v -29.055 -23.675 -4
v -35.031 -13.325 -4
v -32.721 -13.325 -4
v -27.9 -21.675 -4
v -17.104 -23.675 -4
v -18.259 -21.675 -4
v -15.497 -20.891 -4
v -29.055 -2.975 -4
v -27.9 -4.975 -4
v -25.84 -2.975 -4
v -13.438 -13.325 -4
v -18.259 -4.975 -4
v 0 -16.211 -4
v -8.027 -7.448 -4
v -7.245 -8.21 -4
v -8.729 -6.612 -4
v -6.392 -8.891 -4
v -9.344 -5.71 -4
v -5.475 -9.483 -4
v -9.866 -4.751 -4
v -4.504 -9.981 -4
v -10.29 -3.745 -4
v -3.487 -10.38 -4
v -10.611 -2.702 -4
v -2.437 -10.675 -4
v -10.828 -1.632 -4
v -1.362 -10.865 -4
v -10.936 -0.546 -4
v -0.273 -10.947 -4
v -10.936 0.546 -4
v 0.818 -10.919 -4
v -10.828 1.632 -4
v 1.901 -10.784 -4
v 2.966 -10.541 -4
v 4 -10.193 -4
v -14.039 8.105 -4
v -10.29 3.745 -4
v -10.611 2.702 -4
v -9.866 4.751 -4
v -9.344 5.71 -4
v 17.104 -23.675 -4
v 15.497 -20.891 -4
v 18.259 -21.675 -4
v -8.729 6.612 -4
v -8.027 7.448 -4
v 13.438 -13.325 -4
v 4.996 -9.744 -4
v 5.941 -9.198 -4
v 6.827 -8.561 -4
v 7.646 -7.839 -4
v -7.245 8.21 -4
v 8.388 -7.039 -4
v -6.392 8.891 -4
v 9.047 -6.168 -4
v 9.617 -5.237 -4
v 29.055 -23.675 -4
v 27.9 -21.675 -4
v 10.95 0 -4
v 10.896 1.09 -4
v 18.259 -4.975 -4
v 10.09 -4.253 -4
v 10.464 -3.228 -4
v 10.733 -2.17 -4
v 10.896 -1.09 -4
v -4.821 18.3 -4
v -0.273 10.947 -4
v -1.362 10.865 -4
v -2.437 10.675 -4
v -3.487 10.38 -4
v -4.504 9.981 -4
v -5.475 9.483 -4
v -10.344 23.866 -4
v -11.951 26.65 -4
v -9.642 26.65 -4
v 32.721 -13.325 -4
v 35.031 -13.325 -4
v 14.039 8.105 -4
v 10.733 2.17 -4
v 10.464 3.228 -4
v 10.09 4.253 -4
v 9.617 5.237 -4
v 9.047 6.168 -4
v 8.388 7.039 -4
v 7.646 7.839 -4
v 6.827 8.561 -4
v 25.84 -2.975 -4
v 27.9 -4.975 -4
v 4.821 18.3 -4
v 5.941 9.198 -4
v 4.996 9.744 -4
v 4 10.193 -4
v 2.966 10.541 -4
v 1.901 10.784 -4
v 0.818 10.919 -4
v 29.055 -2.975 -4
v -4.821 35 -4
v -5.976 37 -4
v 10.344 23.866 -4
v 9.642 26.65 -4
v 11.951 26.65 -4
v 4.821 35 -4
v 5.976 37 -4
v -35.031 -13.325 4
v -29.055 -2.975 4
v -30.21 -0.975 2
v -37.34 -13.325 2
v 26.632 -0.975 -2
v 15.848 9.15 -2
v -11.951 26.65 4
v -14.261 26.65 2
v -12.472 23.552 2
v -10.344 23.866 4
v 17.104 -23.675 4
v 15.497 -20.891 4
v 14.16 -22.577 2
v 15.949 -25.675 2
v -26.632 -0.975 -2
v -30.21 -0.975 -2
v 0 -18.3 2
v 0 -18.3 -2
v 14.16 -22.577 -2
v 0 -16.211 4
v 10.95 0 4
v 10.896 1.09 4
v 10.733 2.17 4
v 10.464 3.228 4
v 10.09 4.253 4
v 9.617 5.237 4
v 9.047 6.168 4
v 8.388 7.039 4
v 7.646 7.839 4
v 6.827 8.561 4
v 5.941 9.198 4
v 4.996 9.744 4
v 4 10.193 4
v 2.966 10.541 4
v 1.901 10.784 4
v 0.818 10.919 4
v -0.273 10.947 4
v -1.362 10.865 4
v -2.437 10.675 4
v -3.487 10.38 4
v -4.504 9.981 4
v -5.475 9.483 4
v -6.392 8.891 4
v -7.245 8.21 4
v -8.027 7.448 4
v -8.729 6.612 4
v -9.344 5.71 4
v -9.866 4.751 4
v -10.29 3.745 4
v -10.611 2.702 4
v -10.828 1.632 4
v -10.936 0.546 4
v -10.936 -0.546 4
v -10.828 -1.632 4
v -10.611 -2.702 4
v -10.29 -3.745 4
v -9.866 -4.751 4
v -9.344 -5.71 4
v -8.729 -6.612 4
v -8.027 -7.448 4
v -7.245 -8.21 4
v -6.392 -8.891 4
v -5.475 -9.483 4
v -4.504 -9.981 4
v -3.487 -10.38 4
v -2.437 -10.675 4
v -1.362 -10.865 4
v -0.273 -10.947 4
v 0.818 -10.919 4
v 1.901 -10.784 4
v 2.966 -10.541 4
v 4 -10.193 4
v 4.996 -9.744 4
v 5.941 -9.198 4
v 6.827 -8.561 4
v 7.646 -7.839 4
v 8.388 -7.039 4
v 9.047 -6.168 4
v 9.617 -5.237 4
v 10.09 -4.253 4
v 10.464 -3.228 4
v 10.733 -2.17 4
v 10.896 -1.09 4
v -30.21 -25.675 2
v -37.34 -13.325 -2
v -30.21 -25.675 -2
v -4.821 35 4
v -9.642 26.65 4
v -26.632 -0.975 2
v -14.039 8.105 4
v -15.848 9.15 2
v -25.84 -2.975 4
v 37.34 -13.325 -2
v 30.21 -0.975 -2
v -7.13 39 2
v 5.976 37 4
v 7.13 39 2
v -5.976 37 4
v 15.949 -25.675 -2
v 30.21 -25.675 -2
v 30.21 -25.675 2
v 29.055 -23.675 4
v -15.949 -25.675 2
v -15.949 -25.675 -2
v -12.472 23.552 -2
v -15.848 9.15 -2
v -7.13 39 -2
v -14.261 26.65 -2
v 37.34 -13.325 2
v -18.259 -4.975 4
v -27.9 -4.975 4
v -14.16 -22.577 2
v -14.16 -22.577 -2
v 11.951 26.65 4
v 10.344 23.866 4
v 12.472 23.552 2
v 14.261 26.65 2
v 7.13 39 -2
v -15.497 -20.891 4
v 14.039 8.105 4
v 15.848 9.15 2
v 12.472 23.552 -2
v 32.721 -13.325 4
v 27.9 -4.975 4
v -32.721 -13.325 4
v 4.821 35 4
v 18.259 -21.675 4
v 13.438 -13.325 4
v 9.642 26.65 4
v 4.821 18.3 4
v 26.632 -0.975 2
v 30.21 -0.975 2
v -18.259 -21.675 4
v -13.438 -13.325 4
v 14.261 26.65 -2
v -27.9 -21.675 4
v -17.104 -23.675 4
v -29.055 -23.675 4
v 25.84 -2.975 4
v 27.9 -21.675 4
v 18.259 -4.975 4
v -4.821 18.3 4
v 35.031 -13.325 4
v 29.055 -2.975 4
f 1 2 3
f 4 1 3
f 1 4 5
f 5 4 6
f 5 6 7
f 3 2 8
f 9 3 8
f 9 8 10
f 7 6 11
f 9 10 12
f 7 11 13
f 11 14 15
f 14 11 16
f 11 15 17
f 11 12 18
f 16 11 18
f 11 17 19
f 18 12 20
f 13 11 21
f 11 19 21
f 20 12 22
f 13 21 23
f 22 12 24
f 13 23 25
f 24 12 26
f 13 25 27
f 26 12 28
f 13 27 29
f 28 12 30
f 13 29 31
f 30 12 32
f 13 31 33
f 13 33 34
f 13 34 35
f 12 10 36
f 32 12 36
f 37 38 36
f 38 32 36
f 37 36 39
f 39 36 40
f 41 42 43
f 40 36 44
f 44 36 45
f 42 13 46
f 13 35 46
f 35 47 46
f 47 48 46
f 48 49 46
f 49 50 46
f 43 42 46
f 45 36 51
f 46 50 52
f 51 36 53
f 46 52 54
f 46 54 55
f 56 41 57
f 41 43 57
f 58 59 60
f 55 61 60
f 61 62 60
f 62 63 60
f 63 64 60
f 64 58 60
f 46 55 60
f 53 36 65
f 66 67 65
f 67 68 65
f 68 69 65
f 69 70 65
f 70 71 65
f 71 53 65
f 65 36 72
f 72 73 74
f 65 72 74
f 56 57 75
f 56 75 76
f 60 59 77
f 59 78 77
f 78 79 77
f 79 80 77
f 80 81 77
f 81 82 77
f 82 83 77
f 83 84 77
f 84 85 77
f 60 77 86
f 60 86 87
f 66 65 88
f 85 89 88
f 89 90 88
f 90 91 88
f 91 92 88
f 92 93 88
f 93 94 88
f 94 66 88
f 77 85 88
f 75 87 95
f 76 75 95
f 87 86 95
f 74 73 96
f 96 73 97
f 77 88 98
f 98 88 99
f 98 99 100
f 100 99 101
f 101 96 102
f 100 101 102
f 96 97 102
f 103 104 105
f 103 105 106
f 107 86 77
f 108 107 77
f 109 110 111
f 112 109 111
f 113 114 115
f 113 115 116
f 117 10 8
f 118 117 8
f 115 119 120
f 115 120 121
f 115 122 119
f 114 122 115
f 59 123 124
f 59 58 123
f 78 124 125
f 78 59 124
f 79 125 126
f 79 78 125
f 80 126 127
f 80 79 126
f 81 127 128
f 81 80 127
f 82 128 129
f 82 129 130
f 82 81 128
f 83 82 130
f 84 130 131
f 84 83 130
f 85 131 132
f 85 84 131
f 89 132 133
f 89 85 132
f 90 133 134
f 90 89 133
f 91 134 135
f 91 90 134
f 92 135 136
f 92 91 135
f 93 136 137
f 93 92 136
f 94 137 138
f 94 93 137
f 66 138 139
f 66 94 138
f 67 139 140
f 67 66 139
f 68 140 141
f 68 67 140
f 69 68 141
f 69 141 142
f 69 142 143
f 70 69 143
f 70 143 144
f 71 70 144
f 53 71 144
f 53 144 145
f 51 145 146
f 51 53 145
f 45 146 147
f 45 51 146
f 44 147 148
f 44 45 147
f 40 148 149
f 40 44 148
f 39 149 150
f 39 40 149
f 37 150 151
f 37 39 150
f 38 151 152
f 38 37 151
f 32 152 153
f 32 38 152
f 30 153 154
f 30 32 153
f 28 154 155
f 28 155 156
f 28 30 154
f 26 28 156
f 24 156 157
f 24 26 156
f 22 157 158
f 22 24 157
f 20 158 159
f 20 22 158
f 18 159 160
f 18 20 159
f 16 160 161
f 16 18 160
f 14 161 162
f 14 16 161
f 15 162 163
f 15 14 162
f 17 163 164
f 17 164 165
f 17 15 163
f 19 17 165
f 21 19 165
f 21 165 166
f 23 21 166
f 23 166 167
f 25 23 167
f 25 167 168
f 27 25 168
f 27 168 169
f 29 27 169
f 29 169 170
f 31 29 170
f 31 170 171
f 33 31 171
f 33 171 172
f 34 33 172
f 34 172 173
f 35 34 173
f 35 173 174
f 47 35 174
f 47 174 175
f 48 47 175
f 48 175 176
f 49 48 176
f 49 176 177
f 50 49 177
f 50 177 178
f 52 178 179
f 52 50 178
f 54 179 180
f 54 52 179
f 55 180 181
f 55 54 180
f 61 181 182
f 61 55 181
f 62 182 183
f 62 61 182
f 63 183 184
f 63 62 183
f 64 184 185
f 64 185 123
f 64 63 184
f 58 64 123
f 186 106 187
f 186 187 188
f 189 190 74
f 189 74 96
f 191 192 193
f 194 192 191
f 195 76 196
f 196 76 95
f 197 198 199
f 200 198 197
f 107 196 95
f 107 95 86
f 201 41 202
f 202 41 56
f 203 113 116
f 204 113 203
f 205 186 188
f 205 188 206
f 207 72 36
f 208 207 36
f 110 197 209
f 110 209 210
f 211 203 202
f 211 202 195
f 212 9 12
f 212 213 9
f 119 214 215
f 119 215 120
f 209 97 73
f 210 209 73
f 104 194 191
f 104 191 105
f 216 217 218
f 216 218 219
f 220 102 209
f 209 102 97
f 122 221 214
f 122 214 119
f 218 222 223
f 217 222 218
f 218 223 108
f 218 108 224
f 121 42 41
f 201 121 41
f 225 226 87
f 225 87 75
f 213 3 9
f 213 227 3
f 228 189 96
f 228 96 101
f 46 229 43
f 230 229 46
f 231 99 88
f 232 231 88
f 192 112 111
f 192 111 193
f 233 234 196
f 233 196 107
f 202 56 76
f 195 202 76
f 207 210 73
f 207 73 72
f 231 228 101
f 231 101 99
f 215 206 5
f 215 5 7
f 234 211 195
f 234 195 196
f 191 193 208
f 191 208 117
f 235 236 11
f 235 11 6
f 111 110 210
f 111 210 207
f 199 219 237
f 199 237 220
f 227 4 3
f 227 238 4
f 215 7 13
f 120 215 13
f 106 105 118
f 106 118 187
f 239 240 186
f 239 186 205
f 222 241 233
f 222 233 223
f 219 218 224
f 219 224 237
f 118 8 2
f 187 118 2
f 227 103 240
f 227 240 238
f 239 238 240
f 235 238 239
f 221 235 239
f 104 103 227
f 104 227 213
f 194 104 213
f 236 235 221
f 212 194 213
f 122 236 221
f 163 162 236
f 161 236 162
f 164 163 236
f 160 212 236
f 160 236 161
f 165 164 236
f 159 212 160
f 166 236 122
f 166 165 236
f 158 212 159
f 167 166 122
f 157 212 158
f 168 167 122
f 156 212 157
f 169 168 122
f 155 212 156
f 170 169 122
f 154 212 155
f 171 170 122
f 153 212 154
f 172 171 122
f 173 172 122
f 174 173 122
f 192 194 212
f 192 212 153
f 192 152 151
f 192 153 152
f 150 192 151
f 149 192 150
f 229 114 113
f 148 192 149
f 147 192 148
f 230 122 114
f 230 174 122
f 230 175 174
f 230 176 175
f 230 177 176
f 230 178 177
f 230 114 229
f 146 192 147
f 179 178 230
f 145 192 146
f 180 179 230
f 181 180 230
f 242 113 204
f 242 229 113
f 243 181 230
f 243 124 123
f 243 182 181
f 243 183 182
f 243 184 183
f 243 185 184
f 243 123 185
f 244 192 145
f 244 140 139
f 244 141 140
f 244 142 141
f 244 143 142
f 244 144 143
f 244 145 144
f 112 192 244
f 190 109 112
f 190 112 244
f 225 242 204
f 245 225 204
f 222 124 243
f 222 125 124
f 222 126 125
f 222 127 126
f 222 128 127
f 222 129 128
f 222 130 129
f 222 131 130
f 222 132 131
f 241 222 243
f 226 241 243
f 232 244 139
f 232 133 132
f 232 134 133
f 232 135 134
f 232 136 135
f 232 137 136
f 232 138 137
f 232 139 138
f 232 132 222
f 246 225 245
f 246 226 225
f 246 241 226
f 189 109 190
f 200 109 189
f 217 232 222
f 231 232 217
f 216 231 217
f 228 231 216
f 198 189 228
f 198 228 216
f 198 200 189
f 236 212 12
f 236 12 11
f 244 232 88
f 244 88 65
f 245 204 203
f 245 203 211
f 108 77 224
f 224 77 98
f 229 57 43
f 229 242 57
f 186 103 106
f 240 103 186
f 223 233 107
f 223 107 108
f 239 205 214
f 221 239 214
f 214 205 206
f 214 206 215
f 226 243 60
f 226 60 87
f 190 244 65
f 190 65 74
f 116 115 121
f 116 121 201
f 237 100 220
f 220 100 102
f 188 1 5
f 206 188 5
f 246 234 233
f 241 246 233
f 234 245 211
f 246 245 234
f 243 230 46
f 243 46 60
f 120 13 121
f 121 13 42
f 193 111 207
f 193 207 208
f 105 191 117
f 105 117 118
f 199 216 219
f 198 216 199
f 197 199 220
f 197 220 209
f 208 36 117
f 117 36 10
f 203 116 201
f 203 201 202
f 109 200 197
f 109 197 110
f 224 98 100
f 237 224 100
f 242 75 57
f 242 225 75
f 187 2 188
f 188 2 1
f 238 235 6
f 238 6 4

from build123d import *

# Parameters (mm, degrees)
F0_R     = 10.95
F1_DEPTH = 4
F2_SIZE  = 2


with BuildPart() as f1:
    # F0 (on Top) → F1 (new body, symmetric)
    with BuildSketch(Plane.XY):
        Polygon((-7.130276, 39), (-14.260552, 26.65), (-12.471705, 23.551626), (-15.848265, 9.15), (-26.632159, -0.975), (-30.209853, -0.975), (-37.340129, -13.325), (-30.209853, -25.675), (-15.949301, -25.675), (-14.160454, -22.576626), (0, -18.3), (14.160454, -22.576626), (15.949301, -25.675), (30.209853, -25.675), (37.340129, -13.325), (30.209853, -0.975), (26.632159, -0.975), (15.848265, 9.15), (12.471705, 23.551626), (14.260552, 26.65), (7.130276, 39), align=None)
        Polygon((-18.258702, -4.975), (-13.437828, -13.325), (-18.258702, -21.675), (-27.900452, -21.675), (-32.721327, -13.325), (-27.900452, -4.975), align=None, mode=Mode.SUBTRACT)
        Polygon((13.437828, -13.325), (18.258702, -4.975), (27.900452, -4.975), (32.721327, -13.325), (27.900452, -21.675), (18.258702, -21.675), align=None, mode=Mode.SUBTRACT)
        Circle(F0_R, mode=Mode.SUBTRACT)
        Polygon((9.641749, 26.65), (4.820875, 18.3), (-4.820875, 18.3), (-9.641749, 26.65), (-4.820875, 35), (4.820875, 35), align=None, mode=Mode.SUBTRACT)
    extrude(amount=F1_DEPTH, both=True)

    # F2
    f2_edges = [f1.edges().sort_by_distance(p)[0] for p in [
        (10.695414, 32.825, 4),
        (0, 39, 4),
        (-10.695414, 32.825, 4),
        (-13.366128, 25.100813, 4),
        (13.366128, 25.100813, 4),
        (14.159985, 16.350813, 4),
        (21.240212, 4.0875, 4),
        (28.421006, -0.975, 4),
        (33.774991, -7.15, 4),
        (33.774991, -19.5, 4),
        (23.079577, -25.675, 4),
        (7.080227, -20.438313, 4),
        (-7.080227, -20.438313, 4),
        (-15.054878, -24.125813, 4),
        (15.054878, -24.125813, 4),
        (-23.079577, -25.675, 4),
        (-33.774991, -19.5, 4),
        (-33.774991, -7.15, 4),
        (-21.240212, 4.0875, 4),
        (-14.159985, 16.350813, 4),
        (-28.421006, -0.975, 4),
        (-21.240212, 4.0875, -4),
        (-14.159985, 16.350813, -4),
        (-13.366128, 25.100813, -4),
        (-10.695414, 32.825, -4),
        (0, 39, -4),
        (10.695414, 32.825, -4),
        (13.366128, 25.100813, -4),
        (14.159985, 16.350813, -4),
        (21.240212, 4.0875, -4),
        (28.421006, -0.975, -4),
        (33.774991, -7.15, -4),
        (33.774991, -19.5, -4),
        (23.079577, -25.675, -4),
        (15.054878, -24.125813, -4),
        (7.080227, -20.438313, -4),
        (-7.080227, -20.438313, -4),
        (-15.054878, -24.125813, -4),
        (-23.079577, -25.675, -4),
        (-33.774991, -19.5, -4),
        (-33.774991, -7.15, -4),
        (-28.421006, -0.975, -4),
    ]]
    chamfer(f2_edges, length=F2_SIZE)


solid = f1.part
